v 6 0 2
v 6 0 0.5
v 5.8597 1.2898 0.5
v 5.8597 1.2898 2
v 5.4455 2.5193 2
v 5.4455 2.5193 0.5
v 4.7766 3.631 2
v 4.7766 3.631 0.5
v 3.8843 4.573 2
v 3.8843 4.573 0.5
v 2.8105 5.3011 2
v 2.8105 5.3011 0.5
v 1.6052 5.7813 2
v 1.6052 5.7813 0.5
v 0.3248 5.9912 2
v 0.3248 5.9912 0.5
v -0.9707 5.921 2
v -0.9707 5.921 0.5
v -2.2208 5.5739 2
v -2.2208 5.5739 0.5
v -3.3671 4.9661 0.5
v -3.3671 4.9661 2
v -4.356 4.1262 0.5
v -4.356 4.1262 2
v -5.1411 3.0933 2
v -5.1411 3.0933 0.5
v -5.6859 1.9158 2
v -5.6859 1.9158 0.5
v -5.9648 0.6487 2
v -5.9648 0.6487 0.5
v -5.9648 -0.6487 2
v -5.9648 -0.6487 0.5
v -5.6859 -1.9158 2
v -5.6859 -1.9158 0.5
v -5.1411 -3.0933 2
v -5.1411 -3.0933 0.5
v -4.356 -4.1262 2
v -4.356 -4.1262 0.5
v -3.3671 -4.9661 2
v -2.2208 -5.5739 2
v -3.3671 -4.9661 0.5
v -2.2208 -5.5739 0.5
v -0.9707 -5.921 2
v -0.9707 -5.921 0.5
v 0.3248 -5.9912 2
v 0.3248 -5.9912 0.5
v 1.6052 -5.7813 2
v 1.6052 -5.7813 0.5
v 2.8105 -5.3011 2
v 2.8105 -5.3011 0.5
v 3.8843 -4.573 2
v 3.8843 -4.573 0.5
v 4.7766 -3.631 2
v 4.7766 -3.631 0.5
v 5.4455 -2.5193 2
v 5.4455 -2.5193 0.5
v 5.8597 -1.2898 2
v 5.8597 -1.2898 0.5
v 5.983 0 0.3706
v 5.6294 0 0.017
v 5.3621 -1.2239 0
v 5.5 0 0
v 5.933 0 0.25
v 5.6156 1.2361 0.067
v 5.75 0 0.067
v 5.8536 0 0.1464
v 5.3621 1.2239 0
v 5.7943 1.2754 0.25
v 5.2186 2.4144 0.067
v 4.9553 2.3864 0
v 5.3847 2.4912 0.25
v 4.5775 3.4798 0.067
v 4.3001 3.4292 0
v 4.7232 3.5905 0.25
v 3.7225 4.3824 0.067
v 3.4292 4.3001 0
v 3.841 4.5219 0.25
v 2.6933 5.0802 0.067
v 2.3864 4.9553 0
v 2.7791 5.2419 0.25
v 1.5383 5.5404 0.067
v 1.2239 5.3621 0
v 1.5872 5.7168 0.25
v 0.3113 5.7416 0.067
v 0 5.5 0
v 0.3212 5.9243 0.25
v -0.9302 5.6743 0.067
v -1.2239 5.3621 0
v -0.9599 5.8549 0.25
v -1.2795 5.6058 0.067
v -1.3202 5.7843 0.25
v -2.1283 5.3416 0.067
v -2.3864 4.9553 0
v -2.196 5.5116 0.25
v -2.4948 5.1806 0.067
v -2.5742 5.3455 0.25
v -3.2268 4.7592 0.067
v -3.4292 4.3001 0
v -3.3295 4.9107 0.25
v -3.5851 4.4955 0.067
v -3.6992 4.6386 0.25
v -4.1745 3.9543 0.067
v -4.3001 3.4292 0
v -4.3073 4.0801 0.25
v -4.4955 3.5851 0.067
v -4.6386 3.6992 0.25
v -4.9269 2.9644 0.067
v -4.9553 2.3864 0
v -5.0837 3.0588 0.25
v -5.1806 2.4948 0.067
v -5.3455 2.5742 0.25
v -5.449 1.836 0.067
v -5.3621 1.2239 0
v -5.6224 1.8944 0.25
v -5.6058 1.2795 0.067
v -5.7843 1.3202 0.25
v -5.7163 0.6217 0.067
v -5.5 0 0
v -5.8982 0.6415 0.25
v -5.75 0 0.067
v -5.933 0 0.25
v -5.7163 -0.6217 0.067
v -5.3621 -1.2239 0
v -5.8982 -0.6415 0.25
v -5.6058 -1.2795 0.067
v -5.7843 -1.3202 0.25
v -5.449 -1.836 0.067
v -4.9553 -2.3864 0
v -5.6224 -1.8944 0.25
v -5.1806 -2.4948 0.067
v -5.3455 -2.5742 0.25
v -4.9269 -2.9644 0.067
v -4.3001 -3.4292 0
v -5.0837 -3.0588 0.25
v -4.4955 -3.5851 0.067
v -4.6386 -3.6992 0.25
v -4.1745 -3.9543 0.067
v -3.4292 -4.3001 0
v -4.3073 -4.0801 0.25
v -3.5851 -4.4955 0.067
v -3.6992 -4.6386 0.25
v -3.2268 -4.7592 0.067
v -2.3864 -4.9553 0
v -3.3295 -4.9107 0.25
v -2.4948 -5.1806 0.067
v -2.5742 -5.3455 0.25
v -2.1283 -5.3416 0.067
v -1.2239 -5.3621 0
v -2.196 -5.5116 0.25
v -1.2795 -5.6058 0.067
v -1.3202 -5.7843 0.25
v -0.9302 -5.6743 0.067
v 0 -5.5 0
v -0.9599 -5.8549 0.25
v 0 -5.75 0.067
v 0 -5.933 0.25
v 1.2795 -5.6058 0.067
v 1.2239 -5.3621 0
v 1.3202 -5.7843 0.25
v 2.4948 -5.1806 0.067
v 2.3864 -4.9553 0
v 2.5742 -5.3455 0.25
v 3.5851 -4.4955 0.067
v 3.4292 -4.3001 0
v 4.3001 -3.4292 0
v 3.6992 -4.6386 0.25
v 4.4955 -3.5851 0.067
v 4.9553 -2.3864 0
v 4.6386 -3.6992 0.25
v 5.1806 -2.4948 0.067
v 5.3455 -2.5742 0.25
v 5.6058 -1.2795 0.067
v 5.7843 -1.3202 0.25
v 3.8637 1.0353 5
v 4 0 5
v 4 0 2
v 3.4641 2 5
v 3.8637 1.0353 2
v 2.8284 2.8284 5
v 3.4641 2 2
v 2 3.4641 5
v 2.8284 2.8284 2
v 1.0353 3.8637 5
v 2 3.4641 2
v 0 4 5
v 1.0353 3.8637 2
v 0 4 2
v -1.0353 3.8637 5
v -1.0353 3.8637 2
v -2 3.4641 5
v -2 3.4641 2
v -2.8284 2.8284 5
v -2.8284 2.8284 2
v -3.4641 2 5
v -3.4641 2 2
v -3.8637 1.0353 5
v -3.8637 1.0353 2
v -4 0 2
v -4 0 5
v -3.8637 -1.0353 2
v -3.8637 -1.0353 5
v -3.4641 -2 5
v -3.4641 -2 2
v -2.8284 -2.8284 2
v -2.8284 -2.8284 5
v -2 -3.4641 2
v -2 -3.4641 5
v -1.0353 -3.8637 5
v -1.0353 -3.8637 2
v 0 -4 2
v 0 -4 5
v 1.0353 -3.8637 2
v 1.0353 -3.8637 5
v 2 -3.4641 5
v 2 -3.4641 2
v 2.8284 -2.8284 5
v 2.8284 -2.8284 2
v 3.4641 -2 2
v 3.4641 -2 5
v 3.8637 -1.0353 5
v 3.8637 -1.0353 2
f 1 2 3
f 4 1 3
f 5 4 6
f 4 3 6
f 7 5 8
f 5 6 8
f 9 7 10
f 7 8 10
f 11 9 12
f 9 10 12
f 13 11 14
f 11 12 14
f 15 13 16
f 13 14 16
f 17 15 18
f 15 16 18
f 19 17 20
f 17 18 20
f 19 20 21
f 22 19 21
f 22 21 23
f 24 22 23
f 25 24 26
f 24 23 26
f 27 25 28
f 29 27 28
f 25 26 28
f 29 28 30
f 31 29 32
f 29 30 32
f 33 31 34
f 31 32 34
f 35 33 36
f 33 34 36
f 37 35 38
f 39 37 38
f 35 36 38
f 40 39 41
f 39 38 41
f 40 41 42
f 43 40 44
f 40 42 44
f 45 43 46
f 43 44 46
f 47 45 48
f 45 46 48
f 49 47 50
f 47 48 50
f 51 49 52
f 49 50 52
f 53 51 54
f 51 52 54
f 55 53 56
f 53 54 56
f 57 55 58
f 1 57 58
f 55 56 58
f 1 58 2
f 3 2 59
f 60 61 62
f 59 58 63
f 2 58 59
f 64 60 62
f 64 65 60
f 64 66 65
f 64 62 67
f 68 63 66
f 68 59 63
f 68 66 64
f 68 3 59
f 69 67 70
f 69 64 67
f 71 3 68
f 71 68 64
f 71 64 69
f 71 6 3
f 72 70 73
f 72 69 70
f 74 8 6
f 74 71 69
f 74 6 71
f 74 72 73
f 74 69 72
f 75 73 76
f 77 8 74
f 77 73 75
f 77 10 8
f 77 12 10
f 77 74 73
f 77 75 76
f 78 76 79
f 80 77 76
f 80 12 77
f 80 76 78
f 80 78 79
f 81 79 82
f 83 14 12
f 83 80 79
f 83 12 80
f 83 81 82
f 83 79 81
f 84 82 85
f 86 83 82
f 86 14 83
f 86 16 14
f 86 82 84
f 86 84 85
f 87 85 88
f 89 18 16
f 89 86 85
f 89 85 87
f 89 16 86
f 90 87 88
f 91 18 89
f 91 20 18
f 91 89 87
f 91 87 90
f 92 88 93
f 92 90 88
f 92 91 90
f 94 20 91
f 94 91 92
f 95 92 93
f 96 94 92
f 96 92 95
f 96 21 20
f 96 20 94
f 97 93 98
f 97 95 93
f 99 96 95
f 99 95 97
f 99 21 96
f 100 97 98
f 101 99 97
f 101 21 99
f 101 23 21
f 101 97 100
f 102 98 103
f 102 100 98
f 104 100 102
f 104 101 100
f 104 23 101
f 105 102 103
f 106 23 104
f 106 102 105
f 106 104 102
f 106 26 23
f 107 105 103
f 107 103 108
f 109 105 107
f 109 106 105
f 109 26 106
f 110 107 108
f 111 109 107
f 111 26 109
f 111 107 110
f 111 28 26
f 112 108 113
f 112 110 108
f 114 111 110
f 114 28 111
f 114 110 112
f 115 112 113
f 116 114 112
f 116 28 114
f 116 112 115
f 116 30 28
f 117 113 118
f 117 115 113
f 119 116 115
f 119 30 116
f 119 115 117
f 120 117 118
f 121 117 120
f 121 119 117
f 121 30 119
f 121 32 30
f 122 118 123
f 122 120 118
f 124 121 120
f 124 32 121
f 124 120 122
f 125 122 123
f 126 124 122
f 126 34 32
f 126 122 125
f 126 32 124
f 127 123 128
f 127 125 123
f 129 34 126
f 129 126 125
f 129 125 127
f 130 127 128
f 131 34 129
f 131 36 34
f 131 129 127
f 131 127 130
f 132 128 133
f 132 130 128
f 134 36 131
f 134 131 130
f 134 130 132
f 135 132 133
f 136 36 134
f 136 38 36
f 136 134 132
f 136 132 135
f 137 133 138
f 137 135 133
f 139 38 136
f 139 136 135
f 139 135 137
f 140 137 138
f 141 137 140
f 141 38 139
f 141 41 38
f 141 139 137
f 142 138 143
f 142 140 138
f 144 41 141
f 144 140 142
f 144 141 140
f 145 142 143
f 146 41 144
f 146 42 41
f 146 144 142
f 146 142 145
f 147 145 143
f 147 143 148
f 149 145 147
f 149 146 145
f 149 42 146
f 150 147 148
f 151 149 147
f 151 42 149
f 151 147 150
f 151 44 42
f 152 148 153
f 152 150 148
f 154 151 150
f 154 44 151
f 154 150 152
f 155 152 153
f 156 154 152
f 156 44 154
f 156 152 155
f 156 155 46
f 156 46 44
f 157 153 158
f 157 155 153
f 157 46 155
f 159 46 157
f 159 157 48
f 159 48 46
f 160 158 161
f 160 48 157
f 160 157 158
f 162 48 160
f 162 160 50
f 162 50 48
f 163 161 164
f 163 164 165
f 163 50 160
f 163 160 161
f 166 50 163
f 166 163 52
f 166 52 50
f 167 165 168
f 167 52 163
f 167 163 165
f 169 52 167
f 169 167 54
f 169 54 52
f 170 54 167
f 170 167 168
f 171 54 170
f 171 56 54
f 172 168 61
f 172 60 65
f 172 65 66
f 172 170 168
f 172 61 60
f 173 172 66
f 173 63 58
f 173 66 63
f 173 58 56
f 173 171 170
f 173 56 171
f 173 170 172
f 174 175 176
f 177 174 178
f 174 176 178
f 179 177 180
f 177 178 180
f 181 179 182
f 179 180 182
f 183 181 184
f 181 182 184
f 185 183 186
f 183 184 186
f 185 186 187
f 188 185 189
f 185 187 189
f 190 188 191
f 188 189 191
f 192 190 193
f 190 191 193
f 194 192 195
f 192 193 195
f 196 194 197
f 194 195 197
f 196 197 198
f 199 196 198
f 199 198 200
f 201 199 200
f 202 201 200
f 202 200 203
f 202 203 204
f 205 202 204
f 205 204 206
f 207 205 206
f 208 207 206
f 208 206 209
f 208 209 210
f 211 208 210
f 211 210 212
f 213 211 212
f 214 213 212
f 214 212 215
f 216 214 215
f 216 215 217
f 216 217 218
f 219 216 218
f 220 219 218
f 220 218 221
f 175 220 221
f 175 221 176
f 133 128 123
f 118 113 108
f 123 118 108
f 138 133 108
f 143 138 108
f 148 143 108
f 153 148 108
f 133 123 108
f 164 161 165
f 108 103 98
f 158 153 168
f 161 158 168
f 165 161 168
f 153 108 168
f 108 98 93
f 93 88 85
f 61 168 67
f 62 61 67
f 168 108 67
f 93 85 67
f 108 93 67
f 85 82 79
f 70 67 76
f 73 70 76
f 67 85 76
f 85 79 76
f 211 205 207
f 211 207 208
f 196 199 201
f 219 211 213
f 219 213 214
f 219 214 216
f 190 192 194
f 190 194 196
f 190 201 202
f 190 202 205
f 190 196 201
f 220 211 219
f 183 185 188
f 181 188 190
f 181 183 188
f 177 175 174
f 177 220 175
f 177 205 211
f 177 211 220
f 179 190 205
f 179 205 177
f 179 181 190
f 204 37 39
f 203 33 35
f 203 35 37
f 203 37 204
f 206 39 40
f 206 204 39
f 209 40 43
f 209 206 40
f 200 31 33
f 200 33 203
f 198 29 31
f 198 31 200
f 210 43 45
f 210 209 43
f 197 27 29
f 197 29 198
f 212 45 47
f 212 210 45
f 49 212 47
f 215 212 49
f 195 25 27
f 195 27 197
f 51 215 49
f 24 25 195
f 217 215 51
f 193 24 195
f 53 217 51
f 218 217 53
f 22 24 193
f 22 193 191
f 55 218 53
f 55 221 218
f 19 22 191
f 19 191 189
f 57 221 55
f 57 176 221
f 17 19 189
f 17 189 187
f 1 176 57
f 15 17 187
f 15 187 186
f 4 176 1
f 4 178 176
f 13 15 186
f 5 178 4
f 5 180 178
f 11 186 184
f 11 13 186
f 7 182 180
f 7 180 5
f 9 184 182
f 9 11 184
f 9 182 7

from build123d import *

# Parameters (mm, degrees)
F0_R     = 6
F1_DEPTH = 2
F2_R     = 4
F3_DEPTH = 5
F4_R     = 0.5


with BuildPart() as f1:
    # F0 (on Top) → F1 (new body)
    with BuildSketch(Plane.XY):
        Circle(F0_R)
    extrude(amount=F1_DEPTH)

    # F2 (on Top) → F3 (join)
    with BuildSketch(Plane.XY):
        Circle(F2_R)
    extrude(amount=F3_DEPTH)

    # F4
    f4_edges = [f1.edges().sort_by_distance(p)[0] for p in [
        (-6, 0, 0),
    ]]
    fillet(f4_edges, radius=F4_R)


solid = f1.part
